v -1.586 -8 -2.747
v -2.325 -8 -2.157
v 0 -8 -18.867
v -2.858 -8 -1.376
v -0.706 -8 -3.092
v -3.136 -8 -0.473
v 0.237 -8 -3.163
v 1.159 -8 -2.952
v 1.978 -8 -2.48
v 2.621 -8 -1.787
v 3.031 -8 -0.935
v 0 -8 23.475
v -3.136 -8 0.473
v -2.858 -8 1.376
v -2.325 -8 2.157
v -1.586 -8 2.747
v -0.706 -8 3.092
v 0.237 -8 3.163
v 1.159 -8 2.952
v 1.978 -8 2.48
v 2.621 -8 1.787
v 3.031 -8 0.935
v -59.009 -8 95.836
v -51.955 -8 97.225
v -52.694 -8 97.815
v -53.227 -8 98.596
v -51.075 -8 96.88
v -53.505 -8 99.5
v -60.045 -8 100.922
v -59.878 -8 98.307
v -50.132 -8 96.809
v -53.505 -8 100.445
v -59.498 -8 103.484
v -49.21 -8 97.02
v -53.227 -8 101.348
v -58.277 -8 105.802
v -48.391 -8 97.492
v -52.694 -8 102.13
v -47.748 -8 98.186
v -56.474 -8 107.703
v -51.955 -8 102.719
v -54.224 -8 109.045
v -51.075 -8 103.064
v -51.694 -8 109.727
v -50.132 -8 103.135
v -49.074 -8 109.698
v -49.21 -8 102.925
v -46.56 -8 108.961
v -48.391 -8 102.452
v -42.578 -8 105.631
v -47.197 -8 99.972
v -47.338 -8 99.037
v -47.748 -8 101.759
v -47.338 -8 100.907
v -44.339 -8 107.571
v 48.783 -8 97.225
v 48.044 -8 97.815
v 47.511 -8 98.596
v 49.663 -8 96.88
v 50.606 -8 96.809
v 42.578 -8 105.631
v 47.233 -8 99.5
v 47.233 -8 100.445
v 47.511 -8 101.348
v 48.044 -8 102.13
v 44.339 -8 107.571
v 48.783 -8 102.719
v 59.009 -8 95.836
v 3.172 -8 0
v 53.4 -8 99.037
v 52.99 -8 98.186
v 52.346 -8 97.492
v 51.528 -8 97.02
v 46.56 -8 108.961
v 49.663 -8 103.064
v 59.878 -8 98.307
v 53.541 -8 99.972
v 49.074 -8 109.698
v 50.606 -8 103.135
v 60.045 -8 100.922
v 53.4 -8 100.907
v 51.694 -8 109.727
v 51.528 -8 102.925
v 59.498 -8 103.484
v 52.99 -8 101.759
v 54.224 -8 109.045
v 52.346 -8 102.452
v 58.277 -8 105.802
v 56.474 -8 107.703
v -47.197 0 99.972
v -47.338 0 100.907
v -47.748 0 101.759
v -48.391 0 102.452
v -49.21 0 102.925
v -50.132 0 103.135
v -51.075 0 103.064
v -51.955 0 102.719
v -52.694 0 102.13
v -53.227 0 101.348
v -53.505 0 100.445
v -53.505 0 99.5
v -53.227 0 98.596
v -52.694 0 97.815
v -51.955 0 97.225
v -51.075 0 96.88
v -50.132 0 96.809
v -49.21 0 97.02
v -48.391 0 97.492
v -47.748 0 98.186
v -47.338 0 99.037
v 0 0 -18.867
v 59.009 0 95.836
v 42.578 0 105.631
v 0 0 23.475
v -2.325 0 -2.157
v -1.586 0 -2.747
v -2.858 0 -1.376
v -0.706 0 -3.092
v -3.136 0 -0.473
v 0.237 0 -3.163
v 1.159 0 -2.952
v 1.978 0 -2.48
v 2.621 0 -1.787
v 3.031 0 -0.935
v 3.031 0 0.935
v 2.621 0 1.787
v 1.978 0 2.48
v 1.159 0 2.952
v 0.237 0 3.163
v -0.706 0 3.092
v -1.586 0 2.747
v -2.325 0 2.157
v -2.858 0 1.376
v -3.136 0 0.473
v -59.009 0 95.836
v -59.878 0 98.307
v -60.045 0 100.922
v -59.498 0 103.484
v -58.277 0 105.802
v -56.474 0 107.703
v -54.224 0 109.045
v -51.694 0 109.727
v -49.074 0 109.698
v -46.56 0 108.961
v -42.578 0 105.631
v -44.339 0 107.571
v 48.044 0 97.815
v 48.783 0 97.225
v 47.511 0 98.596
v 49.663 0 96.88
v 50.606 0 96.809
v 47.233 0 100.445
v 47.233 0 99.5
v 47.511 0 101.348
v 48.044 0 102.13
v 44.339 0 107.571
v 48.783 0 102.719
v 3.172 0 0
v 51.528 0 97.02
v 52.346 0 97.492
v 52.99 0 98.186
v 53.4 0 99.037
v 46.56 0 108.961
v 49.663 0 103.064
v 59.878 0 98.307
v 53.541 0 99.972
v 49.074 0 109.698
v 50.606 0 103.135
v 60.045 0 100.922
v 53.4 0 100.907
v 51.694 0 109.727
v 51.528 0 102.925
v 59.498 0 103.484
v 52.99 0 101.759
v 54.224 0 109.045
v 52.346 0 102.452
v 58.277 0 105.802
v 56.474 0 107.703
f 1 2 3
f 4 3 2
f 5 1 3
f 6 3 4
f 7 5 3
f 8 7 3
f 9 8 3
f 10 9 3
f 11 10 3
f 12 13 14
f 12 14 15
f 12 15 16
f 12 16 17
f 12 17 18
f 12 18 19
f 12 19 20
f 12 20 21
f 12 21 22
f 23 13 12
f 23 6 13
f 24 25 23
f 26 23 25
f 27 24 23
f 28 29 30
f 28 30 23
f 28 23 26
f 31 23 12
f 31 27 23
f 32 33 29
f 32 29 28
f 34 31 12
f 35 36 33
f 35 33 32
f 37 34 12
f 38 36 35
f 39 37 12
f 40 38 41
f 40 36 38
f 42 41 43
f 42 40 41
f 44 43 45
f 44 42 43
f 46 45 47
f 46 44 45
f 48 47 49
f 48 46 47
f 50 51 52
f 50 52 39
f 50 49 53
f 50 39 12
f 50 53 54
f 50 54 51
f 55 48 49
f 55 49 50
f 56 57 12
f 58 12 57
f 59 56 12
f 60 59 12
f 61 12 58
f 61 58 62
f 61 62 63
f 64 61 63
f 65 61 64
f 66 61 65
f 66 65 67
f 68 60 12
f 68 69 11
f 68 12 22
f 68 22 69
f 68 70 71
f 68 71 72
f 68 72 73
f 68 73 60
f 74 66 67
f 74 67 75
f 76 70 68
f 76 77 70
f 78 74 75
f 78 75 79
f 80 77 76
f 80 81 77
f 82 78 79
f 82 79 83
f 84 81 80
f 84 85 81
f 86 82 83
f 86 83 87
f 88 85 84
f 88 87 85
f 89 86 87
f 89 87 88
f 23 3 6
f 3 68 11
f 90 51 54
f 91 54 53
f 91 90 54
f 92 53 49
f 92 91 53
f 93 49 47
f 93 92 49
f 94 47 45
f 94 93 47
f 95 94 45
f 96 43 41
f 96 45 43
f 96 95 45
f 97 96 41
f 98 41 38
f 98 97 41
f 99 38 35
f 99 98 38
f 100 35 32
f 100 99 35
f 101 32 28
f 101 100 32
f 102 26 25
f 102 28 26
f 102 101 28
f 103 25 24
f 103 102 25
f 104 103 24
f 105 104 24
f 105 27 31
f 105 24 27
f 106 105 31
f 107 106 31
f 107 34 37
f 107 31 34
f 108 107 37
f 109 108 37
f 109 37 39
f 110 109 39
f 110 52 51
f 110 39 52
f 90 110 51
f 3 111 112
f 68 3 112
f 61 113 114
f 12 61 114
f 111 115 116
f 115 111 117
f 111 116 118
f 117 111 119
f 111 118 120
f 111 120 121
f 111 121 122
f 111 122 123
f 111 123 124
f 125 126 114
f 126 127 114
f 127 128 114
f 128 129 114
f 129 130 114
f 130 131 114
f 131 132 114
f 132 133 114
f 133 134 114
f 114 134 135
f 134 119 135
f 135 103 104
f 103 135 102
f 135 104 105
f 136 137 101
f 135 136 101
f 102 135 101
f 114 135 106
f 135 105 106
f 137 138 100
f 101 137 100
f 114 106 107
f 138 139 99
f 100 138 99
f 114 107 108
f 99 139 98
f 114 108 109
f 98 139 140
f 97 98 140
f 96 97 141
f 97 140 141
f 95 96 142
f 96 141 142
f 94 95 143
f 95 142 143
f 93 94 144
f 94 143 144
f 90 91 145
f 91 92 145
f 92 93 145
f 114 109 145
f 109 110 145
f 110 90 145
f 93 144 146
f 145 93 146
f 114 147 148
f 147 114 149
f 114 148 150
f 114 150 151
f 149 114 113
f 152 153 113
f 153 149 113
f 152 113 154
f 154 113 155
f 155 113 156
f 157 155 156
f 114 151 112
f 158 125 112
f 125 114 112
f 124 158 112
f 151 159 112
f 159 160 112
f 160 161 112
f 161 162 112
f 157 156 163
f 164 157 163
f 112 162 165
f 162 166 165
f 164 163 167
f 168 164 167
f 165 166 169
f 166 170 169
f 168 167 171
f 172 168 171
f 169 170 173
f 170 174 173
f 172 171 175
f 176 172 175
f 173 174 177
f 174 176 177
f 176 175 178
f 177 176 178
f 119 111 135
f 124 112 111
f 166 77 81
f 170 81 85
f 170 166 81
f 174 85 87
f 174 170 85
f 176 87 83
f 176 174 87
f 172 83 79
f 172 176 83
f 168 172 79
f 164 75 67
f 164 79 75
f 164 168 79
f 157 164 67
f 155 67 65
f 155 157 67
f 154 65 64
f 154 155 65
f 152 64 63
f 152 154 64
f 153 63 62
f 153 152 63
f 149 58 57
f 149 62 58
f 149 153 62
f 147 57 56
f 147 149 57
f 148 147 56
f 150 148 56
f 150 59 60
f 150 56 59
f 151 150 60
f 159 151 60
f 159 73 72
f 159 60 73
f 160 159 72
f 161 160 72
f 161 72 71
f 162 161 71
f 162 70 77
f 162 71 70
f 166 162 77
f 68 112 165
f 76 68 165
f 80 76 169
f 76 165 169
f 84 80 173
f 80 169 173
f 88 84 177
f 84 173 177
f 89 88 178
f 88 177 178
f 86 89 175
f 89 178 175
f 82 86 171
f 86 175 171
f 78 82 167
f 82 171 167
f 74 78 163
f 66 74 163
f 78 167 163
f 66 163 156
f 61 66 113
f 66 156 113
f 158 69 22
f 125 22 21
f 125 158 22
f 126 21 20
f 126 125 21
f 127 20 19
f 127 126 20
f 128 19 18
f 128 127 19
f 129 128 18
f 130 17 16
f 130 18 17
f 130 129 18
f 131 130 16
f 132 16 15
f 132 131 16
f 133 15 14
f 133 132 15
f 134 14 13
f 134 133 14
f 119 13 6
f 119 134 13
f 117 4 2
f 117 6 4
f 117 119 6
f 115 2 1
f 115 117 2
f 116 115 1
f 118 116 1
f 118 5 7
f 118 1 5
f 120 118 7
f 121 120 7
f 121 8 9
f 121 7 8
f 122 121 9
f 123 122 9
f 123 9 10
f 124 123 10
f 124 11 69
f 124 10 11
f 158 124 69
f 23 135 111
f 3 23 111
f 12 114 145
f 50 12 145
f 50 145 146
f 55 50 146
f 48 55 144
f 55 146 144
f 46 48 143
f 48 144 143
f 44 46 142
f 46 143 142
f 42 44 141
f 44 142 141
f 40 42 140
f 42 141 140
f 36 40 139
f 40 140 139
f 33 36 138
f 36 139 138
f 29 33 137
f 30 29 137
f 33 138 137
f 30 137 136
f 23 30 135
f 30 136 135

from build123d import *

# Parameters (mm, degrees)
F4_DEPTH = 8
F2_R     = 3.171744
F5_DEPTH = 25
F0_R     = 3.171744
F6_DEPTH = 25


with BuildPart() as f4:
    # F3 (on Front) → F4 (new body)
    with BuildSketch(Plane.XZ):
        with BuildLine():
            Line((-59.009388, 95.835626), (0, -18.867213))
            Line((0, -18.867213), (59.009388, 95.835626))
            ThreePointArc((59.009388, 95.835626), (55.394876, 108.451405), (42.578131, 105.631188))
            Line((42.578131, 105.631188), (0, 23.474881))
            Line((0, 23.474881), (-42.578131, 105.631188))
            ThreePointArc((-42.578131, 105.631188), (-55.394876, 108.451405), (-59.009388, 95.835626))
        make_face()
    extrude(amount=F4_DEPTH)

    # F2 (on Front) → F5 (cut)
    with BuildSketch(Plane.XZ):
        with Locations((-50.368942, 99.972241)):
            Circle(F2_R)
        with Locations((50.368942, 99.972241)):
            Circle(F2_R)
    extrude(amount=F5_DEPTH, mode=Mode.SUBTRACT)

    # F0 (on Front) → F6 (cut)
    with BuildSketch(Plane.XZ):
        Circle(F0_R)
    extrude(amount=F6_DEPTH, mode=Mode.SUBTRACT)


solid = f4.part
